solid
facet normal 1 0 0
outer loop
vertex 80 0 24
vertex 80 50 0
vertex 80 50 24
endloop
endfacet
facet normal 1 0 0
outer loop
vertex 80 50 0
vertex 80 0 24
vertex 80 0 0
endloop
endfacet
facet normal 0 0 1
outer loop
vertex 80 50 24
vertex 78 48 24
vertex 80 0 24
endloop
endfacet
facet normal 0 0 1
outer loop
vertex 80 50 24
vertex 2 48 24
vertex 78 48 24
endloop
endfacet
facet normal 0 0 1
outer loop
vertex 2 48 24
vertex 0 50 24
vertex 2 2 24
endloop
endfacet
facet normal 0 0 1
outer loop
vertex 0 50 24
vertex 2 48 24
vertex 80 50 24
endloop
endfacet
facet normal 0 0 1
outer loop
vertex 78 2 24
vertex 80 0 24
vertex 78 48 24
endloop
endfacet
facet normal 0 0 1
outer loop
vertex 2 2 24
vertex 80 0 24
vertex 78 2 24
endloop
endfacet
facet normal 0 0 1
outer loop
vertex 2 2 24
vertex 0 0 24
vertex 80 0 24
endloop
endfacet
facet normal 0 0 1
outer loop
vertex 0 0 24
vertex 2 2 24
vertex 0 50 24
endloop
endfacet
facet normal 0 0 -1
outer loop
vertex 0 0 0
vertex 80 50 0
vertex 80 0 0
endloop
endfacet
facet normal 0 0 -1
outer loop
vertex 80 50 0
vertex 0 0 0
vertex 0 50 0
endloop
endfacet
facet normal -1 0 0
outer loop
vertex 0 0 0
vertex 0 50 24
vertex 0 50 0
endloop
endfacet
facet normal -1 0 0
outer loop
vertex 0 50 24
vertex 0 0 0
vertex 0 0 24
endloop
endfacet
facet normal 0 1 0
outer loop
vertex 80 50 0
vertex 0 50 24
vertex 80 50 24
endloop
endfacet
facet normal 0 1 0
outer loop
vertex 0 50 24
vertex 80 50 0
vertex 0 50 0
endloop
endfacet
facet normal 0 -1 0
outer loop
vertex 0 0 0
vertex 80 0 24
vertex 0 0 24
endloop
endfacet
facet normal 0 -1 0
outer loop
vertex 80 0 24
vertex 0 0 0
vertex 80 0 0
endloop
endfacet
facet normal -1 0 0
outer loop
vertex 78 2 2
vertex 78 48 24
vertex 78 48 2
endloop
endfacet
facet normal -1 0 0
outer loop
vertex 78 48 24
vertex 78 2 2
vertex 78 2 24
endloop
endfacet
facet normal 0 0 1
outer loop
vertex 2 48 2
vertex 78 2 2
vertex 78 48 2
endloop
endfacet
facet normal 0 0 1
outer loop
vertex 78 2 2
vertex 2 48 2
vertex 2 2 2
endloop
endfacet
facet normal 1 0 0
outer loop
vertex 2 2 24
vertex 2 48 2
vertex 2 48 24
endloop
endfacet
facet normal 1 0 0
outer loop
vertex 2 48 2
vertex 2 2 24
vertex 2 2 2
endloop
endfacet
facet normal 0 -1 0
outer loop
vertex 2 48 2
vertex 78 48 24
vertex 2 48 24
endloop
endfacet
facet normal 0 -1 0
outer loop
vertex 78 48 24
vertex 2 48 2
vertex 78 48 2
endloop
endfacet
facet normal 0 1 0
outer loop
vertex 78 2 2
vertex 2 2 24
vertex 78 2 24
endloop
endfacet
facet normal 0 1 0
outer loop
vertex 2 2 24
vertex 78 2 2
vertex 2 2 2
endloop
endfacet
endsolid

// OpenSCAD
// Fictional open-top electronics tray. Not waterproof, mains-rated or load-certified.
// Dimensions are arbitrary reference choices, not recovered hardware dimensions.
part="base"; // [base,lid]
outer=[80,50,24];
wall=2;
floor_thickness=2;
clearance=0.35;
assert(min(outer)>2*wall && floor_thickness>0 && clearance>=0);
module base(){
  difference(){
    cube(outer);
    translate([wall,wall,floor_thickness])
      cube([outer[0]-2*wall,outer[1]-2*wall,outer[2]]);
  }
}
module lid(){
  union(){
    cube([outer[0],outer[1],floor_thickness]);
    translate([wall+clearance,wall+clearance,floor_thickness])
      difference(){
        cube([outer[0]-2*(wall+clearance),outer[1]-2*(wall+clearance),3]);
        translate([wall,wall,-0.1])
          cube([outer[0]-4*wall-2*clearance,outer[1]-4*wall-2*clearance,3.2]);
      }
  }
}
if(part=="base") base(); else if(part=="lid") lid(); else assert(false,"Choose base or lid");
